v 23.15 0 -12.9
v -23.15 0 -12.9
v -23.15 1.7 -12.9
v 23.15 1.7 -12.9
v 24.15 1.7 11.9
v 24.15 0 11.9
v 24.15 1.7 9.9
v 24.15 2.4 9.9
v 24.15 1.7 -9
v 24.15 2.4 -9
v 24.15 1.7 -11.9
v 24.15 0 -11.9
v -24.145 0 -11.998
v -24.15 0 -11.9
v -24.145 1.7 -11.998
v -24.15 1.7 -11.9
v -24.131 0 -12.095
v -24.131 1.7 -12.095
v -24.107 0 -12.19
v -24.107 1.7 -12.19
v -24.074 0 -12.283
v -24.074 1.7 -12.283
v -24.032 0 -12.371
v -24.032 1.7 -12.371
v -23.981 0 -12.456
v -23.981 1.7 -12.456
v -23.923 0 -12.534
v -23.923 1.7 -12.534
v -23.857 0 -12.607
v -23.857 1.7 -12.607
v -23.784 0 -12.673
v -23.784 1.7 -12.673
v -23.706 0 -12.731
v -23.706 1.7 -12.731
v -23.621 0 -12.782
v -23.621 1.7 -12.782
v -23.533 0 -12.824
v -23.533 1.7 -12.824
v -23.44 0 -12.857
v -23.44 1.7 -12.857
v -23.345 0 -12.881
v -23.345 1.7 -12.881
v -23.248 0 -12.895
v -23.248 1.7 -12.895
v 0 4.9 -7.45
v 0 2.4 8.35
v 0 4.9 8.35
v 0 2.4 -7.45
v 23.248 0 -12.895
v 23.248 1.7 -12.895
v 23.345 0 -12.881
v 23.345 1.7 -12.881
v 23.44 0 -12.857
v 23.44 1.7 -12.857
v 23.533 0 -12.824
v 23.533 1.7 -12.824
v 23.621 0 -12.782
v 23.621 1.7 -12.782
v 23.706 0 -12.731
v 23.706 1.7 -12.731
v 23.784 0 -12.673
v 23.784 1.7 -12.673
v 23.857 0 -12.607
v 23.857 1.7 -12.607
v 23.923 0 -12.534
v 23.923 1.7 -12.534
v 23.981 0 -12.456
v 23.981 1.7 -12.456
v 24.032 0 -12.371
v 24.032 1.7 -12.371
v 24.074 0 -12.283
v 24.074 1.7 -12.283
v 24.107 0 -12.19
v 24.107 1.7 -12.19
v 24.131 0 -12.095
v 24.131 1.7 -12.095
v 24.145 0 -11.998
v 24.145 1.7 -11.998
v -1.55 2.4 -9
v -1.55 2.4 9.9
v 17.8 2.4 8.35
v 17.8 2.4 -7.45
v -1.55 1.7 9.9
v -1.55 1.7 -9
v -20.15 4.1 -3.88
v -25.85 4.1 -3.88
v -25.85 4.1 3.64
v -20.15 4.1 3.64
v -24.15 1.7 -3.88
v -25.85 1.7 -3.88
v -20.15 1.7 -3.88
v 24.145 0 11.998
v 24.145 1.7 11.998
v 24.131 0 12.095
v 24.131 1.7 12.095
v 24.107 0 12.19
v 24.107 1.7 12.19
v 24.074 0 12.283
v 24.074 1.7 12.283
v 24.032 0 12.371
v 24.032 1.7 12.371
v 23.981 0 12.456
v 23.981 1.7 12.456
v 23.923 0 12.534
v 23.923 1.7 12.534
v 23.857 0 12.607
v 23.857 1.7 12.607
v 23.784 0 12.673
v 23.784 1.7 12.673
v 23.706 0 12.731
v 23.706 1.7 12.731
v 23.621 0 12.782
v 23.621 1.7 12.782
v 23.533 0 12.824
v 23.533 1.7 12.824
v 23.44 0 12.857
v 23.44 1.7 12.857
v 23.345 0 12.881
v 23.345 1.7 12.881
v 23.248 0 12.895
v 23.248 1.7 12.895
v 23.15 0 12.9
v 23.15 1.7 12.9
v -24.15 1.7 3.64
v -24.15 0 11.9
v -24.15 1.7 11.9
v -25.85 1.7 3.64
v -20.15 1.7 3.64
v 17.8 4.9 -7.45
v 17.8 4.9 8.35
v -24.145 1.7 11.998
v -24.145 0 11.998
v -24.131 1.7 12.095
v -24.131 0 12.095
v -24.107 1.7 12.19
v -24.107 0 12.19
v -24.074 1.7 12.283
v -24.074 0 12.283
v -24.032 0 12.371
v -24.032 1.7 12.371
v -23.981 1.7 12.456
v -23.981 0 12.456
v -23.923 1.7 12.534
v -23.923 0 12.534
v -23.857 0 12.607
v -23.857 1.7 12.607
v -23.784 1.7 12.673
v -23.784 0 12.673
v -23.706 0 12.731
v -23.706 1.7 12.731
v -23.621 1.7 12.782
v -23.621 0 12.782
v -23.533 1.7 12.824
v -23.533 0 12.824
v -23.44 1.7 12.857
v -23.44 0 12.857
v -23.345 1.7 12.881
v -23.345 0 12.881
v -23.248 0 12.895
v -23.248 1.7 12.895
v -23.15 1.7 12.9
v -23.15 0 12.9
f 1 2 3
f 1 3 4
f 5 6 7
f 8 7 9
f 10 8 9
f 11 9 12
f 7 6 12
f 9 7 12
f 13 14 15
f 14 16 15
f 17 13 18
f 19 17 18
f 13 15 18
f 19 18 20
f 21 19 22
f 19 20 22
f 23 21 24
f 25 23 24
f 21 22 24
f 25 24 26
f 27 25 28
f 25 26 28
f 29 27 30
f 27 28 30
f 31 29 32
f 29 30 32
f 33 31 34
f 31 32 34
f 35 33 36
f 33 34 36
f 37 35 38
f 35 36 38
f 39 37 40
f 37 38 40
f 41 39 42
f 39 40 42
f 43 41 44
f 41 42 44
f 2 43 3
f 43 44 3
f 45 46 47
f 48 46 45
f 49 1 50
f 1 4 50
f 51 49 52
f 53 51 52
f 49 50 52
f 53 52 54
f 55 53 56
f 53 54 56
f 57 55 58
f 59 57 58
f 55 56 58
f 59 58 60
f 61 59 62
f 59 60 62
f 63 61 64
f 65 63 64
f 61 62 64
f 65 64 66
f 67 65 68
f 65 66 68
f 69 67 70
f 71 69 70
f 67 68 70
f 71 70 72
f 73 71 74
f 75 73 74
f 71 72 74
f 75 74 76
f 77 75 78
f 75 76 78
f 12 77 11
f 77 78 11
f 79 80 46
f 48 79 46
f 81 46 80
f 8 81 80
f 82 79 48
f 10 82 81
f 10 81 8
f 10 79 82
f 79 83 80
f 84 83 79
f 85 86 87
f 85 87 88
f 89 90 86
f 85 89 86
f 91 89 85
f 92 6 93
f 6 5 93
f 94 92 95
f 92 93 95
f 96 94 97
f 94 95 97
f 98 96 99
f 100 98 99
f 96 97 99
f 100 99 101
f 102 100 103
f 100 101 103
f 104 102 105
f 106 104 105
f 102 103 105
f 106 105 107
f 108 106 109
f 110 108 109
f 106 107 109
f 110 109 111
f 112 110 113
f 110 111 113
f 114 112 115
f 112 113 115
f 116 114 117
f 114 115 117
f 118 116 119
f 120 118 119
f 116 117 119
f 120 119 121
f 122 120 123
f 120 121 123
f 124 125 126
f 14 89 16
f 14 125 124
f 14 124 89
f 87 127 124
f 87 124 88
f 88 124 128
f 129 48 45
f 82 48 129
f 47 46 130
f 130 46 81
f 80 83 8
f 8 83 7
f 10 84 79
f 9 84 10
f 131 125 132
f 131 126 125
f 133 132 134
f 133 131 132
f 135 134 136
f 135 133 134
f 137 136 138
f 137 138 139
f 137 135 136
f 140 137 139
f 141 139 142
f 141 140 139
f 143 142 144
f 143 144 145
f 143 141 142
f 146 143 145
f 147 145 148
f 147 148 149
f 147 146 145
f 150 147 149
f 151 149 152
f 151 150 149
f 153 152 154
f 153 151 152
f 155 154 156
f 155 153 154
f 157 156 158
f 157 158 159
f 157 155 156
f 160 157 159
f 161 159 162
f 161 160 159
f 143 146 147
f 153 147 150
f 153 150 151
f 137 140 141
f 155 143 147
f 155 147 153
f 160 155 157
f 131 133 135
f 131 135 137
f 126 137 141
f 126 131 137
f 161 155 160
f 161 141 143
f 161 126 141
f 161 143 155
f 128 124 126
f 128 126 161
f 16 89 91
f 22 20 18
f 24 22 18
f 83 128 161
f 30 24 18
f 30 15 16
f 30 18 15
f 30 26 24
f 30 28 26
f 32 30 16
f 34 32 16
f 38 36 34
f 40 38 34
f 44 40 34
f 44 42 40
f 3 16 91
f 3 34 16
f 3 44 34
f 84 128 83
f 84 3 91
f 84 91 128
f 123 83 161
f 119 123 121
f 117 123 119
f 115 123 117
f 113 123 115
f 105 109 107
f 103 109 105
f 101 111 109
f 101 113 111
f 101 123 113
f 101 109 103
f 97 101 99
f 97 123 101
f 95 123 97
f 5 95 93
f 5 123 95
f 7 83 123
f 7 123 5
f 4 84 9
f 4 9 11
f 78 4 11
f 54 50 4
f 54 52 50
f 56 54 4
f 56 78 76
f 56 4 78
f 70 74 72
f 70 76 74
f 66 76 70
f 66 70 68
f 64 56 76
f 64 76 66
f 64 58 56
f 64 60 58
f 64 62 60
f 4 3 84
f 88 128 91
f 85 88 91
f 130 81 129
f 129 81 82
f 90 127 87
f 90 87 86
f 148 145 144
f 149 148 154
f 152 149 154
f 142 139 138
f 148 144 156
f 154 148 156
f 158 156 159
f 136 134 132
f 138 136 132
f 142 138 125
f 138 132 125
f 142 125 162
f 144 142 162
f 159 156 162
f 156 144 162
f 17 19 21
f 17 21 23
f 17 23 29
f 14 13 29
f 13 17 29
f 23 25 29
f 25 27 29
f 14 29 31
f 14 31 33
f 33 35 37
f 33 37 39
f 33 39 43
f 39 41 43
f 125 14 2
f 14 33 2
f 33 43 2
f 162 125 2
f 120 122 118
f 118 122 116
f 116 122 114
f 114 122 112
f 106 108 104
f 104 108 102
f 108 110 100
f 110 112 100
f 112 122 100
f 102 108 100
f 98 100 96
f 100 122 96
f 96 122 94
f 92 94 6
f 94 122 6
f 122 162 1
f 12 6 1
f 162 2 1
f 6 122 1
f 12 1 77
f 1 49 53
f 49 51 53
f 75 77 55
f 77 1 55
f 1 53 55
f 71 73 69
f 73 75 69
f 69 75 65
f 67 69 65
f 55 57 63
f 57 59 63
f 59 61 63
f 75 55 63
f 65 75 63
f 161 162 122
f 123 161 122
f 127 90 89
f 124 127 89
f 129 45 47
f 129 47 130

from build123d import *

# Parameters (mm, degrees)
CROQUIS1_W              = 48.3
CROQUIS1_H              = 25.8
SALIENTE_EXTRUIR1_DEPTH = 1.7
CROQUIS2_W              = 25.7
CROQUIS2_H              = 18.9
SALIENTE_EXTRUIR2_DEPTH = 0.7
CROQUIS3_W              = 17.8
CROQUIS3_H              = 15.8
SALIENTE_EXTRUIR3_DEPTH = 2.5
CROQUIS4_W              = 5.7
CROQUIS4_H              = 7.52
SALIENTE_EXTRUIR4_DEPTH = 2.4
REDONDEO1_R             = 1


with BuildPart() as part:
    # Croquis1 → Saliente-Extruir1 (new body)
    with BuildSketch(Plane(origin=(0, 0, 0), x_dir=(1, 0, 0), z_dir=(0, 1, 0))):
        Rectangle(CROQUIS1_W, CROQUIS1_H)
    extrude(amount=SALIENTE_EXTRUIR1_DEPTH)

    # Croquis2 → Saliente-Extruir2 (add)
    with BuildSketch(Plane(origin=(0, 1.7, 0), x_dir=(1, 0, 0), z_dir=(0, 1, 0))):
        with Locations((11.3, -0.45)):
            Rectangle(CROQUIS2_W, CROQUIS2_H)
    extrude(amount=SALIENTE_EXTRUIR2_DEPTH)

    # Croquis3 → Saliente-Extruir3 (add)
    with BuildSketch(Plane(origin=(0, 2.4, 0), x_dir=(1, 0, 0), z_dir=(0, 1, 0))):
        with Locations((8.9, -0.45)):
            Rectangle(CROQUIS3_W, CROQUIS3_H)
    extrude(amount=SALIENTE_EXTRUIR3_DEPTH)

    # Croquis4 → Saliente-Extruir4 (add)
    with BuildSketch(Plane(origin=(0, 1.7, 0), x_dir=(1, 0, 0), z_dir=(0, 1, 0))):
        with Locations((-23, 0.12)):
            Rectangle(CROQUIS4_W, CROQUIS4_H)
    extrude(amount=SALIENTE_EXTRUIR4_DEPTH)

    # Redondeo1
    redondeo1_edges = [part.edges().sort_by_distance(p)[0] for p in [
        (24.15, 0.85, 12.9),
        (-24.15, 0.85, 12.9),
        (-24.15, 0.85, -12.9),
        (24.15, 0.85, -12.9),
    ]]
    fillet(redondeo1_edges, radius=REDONDEO1_R)


solid = part.part
